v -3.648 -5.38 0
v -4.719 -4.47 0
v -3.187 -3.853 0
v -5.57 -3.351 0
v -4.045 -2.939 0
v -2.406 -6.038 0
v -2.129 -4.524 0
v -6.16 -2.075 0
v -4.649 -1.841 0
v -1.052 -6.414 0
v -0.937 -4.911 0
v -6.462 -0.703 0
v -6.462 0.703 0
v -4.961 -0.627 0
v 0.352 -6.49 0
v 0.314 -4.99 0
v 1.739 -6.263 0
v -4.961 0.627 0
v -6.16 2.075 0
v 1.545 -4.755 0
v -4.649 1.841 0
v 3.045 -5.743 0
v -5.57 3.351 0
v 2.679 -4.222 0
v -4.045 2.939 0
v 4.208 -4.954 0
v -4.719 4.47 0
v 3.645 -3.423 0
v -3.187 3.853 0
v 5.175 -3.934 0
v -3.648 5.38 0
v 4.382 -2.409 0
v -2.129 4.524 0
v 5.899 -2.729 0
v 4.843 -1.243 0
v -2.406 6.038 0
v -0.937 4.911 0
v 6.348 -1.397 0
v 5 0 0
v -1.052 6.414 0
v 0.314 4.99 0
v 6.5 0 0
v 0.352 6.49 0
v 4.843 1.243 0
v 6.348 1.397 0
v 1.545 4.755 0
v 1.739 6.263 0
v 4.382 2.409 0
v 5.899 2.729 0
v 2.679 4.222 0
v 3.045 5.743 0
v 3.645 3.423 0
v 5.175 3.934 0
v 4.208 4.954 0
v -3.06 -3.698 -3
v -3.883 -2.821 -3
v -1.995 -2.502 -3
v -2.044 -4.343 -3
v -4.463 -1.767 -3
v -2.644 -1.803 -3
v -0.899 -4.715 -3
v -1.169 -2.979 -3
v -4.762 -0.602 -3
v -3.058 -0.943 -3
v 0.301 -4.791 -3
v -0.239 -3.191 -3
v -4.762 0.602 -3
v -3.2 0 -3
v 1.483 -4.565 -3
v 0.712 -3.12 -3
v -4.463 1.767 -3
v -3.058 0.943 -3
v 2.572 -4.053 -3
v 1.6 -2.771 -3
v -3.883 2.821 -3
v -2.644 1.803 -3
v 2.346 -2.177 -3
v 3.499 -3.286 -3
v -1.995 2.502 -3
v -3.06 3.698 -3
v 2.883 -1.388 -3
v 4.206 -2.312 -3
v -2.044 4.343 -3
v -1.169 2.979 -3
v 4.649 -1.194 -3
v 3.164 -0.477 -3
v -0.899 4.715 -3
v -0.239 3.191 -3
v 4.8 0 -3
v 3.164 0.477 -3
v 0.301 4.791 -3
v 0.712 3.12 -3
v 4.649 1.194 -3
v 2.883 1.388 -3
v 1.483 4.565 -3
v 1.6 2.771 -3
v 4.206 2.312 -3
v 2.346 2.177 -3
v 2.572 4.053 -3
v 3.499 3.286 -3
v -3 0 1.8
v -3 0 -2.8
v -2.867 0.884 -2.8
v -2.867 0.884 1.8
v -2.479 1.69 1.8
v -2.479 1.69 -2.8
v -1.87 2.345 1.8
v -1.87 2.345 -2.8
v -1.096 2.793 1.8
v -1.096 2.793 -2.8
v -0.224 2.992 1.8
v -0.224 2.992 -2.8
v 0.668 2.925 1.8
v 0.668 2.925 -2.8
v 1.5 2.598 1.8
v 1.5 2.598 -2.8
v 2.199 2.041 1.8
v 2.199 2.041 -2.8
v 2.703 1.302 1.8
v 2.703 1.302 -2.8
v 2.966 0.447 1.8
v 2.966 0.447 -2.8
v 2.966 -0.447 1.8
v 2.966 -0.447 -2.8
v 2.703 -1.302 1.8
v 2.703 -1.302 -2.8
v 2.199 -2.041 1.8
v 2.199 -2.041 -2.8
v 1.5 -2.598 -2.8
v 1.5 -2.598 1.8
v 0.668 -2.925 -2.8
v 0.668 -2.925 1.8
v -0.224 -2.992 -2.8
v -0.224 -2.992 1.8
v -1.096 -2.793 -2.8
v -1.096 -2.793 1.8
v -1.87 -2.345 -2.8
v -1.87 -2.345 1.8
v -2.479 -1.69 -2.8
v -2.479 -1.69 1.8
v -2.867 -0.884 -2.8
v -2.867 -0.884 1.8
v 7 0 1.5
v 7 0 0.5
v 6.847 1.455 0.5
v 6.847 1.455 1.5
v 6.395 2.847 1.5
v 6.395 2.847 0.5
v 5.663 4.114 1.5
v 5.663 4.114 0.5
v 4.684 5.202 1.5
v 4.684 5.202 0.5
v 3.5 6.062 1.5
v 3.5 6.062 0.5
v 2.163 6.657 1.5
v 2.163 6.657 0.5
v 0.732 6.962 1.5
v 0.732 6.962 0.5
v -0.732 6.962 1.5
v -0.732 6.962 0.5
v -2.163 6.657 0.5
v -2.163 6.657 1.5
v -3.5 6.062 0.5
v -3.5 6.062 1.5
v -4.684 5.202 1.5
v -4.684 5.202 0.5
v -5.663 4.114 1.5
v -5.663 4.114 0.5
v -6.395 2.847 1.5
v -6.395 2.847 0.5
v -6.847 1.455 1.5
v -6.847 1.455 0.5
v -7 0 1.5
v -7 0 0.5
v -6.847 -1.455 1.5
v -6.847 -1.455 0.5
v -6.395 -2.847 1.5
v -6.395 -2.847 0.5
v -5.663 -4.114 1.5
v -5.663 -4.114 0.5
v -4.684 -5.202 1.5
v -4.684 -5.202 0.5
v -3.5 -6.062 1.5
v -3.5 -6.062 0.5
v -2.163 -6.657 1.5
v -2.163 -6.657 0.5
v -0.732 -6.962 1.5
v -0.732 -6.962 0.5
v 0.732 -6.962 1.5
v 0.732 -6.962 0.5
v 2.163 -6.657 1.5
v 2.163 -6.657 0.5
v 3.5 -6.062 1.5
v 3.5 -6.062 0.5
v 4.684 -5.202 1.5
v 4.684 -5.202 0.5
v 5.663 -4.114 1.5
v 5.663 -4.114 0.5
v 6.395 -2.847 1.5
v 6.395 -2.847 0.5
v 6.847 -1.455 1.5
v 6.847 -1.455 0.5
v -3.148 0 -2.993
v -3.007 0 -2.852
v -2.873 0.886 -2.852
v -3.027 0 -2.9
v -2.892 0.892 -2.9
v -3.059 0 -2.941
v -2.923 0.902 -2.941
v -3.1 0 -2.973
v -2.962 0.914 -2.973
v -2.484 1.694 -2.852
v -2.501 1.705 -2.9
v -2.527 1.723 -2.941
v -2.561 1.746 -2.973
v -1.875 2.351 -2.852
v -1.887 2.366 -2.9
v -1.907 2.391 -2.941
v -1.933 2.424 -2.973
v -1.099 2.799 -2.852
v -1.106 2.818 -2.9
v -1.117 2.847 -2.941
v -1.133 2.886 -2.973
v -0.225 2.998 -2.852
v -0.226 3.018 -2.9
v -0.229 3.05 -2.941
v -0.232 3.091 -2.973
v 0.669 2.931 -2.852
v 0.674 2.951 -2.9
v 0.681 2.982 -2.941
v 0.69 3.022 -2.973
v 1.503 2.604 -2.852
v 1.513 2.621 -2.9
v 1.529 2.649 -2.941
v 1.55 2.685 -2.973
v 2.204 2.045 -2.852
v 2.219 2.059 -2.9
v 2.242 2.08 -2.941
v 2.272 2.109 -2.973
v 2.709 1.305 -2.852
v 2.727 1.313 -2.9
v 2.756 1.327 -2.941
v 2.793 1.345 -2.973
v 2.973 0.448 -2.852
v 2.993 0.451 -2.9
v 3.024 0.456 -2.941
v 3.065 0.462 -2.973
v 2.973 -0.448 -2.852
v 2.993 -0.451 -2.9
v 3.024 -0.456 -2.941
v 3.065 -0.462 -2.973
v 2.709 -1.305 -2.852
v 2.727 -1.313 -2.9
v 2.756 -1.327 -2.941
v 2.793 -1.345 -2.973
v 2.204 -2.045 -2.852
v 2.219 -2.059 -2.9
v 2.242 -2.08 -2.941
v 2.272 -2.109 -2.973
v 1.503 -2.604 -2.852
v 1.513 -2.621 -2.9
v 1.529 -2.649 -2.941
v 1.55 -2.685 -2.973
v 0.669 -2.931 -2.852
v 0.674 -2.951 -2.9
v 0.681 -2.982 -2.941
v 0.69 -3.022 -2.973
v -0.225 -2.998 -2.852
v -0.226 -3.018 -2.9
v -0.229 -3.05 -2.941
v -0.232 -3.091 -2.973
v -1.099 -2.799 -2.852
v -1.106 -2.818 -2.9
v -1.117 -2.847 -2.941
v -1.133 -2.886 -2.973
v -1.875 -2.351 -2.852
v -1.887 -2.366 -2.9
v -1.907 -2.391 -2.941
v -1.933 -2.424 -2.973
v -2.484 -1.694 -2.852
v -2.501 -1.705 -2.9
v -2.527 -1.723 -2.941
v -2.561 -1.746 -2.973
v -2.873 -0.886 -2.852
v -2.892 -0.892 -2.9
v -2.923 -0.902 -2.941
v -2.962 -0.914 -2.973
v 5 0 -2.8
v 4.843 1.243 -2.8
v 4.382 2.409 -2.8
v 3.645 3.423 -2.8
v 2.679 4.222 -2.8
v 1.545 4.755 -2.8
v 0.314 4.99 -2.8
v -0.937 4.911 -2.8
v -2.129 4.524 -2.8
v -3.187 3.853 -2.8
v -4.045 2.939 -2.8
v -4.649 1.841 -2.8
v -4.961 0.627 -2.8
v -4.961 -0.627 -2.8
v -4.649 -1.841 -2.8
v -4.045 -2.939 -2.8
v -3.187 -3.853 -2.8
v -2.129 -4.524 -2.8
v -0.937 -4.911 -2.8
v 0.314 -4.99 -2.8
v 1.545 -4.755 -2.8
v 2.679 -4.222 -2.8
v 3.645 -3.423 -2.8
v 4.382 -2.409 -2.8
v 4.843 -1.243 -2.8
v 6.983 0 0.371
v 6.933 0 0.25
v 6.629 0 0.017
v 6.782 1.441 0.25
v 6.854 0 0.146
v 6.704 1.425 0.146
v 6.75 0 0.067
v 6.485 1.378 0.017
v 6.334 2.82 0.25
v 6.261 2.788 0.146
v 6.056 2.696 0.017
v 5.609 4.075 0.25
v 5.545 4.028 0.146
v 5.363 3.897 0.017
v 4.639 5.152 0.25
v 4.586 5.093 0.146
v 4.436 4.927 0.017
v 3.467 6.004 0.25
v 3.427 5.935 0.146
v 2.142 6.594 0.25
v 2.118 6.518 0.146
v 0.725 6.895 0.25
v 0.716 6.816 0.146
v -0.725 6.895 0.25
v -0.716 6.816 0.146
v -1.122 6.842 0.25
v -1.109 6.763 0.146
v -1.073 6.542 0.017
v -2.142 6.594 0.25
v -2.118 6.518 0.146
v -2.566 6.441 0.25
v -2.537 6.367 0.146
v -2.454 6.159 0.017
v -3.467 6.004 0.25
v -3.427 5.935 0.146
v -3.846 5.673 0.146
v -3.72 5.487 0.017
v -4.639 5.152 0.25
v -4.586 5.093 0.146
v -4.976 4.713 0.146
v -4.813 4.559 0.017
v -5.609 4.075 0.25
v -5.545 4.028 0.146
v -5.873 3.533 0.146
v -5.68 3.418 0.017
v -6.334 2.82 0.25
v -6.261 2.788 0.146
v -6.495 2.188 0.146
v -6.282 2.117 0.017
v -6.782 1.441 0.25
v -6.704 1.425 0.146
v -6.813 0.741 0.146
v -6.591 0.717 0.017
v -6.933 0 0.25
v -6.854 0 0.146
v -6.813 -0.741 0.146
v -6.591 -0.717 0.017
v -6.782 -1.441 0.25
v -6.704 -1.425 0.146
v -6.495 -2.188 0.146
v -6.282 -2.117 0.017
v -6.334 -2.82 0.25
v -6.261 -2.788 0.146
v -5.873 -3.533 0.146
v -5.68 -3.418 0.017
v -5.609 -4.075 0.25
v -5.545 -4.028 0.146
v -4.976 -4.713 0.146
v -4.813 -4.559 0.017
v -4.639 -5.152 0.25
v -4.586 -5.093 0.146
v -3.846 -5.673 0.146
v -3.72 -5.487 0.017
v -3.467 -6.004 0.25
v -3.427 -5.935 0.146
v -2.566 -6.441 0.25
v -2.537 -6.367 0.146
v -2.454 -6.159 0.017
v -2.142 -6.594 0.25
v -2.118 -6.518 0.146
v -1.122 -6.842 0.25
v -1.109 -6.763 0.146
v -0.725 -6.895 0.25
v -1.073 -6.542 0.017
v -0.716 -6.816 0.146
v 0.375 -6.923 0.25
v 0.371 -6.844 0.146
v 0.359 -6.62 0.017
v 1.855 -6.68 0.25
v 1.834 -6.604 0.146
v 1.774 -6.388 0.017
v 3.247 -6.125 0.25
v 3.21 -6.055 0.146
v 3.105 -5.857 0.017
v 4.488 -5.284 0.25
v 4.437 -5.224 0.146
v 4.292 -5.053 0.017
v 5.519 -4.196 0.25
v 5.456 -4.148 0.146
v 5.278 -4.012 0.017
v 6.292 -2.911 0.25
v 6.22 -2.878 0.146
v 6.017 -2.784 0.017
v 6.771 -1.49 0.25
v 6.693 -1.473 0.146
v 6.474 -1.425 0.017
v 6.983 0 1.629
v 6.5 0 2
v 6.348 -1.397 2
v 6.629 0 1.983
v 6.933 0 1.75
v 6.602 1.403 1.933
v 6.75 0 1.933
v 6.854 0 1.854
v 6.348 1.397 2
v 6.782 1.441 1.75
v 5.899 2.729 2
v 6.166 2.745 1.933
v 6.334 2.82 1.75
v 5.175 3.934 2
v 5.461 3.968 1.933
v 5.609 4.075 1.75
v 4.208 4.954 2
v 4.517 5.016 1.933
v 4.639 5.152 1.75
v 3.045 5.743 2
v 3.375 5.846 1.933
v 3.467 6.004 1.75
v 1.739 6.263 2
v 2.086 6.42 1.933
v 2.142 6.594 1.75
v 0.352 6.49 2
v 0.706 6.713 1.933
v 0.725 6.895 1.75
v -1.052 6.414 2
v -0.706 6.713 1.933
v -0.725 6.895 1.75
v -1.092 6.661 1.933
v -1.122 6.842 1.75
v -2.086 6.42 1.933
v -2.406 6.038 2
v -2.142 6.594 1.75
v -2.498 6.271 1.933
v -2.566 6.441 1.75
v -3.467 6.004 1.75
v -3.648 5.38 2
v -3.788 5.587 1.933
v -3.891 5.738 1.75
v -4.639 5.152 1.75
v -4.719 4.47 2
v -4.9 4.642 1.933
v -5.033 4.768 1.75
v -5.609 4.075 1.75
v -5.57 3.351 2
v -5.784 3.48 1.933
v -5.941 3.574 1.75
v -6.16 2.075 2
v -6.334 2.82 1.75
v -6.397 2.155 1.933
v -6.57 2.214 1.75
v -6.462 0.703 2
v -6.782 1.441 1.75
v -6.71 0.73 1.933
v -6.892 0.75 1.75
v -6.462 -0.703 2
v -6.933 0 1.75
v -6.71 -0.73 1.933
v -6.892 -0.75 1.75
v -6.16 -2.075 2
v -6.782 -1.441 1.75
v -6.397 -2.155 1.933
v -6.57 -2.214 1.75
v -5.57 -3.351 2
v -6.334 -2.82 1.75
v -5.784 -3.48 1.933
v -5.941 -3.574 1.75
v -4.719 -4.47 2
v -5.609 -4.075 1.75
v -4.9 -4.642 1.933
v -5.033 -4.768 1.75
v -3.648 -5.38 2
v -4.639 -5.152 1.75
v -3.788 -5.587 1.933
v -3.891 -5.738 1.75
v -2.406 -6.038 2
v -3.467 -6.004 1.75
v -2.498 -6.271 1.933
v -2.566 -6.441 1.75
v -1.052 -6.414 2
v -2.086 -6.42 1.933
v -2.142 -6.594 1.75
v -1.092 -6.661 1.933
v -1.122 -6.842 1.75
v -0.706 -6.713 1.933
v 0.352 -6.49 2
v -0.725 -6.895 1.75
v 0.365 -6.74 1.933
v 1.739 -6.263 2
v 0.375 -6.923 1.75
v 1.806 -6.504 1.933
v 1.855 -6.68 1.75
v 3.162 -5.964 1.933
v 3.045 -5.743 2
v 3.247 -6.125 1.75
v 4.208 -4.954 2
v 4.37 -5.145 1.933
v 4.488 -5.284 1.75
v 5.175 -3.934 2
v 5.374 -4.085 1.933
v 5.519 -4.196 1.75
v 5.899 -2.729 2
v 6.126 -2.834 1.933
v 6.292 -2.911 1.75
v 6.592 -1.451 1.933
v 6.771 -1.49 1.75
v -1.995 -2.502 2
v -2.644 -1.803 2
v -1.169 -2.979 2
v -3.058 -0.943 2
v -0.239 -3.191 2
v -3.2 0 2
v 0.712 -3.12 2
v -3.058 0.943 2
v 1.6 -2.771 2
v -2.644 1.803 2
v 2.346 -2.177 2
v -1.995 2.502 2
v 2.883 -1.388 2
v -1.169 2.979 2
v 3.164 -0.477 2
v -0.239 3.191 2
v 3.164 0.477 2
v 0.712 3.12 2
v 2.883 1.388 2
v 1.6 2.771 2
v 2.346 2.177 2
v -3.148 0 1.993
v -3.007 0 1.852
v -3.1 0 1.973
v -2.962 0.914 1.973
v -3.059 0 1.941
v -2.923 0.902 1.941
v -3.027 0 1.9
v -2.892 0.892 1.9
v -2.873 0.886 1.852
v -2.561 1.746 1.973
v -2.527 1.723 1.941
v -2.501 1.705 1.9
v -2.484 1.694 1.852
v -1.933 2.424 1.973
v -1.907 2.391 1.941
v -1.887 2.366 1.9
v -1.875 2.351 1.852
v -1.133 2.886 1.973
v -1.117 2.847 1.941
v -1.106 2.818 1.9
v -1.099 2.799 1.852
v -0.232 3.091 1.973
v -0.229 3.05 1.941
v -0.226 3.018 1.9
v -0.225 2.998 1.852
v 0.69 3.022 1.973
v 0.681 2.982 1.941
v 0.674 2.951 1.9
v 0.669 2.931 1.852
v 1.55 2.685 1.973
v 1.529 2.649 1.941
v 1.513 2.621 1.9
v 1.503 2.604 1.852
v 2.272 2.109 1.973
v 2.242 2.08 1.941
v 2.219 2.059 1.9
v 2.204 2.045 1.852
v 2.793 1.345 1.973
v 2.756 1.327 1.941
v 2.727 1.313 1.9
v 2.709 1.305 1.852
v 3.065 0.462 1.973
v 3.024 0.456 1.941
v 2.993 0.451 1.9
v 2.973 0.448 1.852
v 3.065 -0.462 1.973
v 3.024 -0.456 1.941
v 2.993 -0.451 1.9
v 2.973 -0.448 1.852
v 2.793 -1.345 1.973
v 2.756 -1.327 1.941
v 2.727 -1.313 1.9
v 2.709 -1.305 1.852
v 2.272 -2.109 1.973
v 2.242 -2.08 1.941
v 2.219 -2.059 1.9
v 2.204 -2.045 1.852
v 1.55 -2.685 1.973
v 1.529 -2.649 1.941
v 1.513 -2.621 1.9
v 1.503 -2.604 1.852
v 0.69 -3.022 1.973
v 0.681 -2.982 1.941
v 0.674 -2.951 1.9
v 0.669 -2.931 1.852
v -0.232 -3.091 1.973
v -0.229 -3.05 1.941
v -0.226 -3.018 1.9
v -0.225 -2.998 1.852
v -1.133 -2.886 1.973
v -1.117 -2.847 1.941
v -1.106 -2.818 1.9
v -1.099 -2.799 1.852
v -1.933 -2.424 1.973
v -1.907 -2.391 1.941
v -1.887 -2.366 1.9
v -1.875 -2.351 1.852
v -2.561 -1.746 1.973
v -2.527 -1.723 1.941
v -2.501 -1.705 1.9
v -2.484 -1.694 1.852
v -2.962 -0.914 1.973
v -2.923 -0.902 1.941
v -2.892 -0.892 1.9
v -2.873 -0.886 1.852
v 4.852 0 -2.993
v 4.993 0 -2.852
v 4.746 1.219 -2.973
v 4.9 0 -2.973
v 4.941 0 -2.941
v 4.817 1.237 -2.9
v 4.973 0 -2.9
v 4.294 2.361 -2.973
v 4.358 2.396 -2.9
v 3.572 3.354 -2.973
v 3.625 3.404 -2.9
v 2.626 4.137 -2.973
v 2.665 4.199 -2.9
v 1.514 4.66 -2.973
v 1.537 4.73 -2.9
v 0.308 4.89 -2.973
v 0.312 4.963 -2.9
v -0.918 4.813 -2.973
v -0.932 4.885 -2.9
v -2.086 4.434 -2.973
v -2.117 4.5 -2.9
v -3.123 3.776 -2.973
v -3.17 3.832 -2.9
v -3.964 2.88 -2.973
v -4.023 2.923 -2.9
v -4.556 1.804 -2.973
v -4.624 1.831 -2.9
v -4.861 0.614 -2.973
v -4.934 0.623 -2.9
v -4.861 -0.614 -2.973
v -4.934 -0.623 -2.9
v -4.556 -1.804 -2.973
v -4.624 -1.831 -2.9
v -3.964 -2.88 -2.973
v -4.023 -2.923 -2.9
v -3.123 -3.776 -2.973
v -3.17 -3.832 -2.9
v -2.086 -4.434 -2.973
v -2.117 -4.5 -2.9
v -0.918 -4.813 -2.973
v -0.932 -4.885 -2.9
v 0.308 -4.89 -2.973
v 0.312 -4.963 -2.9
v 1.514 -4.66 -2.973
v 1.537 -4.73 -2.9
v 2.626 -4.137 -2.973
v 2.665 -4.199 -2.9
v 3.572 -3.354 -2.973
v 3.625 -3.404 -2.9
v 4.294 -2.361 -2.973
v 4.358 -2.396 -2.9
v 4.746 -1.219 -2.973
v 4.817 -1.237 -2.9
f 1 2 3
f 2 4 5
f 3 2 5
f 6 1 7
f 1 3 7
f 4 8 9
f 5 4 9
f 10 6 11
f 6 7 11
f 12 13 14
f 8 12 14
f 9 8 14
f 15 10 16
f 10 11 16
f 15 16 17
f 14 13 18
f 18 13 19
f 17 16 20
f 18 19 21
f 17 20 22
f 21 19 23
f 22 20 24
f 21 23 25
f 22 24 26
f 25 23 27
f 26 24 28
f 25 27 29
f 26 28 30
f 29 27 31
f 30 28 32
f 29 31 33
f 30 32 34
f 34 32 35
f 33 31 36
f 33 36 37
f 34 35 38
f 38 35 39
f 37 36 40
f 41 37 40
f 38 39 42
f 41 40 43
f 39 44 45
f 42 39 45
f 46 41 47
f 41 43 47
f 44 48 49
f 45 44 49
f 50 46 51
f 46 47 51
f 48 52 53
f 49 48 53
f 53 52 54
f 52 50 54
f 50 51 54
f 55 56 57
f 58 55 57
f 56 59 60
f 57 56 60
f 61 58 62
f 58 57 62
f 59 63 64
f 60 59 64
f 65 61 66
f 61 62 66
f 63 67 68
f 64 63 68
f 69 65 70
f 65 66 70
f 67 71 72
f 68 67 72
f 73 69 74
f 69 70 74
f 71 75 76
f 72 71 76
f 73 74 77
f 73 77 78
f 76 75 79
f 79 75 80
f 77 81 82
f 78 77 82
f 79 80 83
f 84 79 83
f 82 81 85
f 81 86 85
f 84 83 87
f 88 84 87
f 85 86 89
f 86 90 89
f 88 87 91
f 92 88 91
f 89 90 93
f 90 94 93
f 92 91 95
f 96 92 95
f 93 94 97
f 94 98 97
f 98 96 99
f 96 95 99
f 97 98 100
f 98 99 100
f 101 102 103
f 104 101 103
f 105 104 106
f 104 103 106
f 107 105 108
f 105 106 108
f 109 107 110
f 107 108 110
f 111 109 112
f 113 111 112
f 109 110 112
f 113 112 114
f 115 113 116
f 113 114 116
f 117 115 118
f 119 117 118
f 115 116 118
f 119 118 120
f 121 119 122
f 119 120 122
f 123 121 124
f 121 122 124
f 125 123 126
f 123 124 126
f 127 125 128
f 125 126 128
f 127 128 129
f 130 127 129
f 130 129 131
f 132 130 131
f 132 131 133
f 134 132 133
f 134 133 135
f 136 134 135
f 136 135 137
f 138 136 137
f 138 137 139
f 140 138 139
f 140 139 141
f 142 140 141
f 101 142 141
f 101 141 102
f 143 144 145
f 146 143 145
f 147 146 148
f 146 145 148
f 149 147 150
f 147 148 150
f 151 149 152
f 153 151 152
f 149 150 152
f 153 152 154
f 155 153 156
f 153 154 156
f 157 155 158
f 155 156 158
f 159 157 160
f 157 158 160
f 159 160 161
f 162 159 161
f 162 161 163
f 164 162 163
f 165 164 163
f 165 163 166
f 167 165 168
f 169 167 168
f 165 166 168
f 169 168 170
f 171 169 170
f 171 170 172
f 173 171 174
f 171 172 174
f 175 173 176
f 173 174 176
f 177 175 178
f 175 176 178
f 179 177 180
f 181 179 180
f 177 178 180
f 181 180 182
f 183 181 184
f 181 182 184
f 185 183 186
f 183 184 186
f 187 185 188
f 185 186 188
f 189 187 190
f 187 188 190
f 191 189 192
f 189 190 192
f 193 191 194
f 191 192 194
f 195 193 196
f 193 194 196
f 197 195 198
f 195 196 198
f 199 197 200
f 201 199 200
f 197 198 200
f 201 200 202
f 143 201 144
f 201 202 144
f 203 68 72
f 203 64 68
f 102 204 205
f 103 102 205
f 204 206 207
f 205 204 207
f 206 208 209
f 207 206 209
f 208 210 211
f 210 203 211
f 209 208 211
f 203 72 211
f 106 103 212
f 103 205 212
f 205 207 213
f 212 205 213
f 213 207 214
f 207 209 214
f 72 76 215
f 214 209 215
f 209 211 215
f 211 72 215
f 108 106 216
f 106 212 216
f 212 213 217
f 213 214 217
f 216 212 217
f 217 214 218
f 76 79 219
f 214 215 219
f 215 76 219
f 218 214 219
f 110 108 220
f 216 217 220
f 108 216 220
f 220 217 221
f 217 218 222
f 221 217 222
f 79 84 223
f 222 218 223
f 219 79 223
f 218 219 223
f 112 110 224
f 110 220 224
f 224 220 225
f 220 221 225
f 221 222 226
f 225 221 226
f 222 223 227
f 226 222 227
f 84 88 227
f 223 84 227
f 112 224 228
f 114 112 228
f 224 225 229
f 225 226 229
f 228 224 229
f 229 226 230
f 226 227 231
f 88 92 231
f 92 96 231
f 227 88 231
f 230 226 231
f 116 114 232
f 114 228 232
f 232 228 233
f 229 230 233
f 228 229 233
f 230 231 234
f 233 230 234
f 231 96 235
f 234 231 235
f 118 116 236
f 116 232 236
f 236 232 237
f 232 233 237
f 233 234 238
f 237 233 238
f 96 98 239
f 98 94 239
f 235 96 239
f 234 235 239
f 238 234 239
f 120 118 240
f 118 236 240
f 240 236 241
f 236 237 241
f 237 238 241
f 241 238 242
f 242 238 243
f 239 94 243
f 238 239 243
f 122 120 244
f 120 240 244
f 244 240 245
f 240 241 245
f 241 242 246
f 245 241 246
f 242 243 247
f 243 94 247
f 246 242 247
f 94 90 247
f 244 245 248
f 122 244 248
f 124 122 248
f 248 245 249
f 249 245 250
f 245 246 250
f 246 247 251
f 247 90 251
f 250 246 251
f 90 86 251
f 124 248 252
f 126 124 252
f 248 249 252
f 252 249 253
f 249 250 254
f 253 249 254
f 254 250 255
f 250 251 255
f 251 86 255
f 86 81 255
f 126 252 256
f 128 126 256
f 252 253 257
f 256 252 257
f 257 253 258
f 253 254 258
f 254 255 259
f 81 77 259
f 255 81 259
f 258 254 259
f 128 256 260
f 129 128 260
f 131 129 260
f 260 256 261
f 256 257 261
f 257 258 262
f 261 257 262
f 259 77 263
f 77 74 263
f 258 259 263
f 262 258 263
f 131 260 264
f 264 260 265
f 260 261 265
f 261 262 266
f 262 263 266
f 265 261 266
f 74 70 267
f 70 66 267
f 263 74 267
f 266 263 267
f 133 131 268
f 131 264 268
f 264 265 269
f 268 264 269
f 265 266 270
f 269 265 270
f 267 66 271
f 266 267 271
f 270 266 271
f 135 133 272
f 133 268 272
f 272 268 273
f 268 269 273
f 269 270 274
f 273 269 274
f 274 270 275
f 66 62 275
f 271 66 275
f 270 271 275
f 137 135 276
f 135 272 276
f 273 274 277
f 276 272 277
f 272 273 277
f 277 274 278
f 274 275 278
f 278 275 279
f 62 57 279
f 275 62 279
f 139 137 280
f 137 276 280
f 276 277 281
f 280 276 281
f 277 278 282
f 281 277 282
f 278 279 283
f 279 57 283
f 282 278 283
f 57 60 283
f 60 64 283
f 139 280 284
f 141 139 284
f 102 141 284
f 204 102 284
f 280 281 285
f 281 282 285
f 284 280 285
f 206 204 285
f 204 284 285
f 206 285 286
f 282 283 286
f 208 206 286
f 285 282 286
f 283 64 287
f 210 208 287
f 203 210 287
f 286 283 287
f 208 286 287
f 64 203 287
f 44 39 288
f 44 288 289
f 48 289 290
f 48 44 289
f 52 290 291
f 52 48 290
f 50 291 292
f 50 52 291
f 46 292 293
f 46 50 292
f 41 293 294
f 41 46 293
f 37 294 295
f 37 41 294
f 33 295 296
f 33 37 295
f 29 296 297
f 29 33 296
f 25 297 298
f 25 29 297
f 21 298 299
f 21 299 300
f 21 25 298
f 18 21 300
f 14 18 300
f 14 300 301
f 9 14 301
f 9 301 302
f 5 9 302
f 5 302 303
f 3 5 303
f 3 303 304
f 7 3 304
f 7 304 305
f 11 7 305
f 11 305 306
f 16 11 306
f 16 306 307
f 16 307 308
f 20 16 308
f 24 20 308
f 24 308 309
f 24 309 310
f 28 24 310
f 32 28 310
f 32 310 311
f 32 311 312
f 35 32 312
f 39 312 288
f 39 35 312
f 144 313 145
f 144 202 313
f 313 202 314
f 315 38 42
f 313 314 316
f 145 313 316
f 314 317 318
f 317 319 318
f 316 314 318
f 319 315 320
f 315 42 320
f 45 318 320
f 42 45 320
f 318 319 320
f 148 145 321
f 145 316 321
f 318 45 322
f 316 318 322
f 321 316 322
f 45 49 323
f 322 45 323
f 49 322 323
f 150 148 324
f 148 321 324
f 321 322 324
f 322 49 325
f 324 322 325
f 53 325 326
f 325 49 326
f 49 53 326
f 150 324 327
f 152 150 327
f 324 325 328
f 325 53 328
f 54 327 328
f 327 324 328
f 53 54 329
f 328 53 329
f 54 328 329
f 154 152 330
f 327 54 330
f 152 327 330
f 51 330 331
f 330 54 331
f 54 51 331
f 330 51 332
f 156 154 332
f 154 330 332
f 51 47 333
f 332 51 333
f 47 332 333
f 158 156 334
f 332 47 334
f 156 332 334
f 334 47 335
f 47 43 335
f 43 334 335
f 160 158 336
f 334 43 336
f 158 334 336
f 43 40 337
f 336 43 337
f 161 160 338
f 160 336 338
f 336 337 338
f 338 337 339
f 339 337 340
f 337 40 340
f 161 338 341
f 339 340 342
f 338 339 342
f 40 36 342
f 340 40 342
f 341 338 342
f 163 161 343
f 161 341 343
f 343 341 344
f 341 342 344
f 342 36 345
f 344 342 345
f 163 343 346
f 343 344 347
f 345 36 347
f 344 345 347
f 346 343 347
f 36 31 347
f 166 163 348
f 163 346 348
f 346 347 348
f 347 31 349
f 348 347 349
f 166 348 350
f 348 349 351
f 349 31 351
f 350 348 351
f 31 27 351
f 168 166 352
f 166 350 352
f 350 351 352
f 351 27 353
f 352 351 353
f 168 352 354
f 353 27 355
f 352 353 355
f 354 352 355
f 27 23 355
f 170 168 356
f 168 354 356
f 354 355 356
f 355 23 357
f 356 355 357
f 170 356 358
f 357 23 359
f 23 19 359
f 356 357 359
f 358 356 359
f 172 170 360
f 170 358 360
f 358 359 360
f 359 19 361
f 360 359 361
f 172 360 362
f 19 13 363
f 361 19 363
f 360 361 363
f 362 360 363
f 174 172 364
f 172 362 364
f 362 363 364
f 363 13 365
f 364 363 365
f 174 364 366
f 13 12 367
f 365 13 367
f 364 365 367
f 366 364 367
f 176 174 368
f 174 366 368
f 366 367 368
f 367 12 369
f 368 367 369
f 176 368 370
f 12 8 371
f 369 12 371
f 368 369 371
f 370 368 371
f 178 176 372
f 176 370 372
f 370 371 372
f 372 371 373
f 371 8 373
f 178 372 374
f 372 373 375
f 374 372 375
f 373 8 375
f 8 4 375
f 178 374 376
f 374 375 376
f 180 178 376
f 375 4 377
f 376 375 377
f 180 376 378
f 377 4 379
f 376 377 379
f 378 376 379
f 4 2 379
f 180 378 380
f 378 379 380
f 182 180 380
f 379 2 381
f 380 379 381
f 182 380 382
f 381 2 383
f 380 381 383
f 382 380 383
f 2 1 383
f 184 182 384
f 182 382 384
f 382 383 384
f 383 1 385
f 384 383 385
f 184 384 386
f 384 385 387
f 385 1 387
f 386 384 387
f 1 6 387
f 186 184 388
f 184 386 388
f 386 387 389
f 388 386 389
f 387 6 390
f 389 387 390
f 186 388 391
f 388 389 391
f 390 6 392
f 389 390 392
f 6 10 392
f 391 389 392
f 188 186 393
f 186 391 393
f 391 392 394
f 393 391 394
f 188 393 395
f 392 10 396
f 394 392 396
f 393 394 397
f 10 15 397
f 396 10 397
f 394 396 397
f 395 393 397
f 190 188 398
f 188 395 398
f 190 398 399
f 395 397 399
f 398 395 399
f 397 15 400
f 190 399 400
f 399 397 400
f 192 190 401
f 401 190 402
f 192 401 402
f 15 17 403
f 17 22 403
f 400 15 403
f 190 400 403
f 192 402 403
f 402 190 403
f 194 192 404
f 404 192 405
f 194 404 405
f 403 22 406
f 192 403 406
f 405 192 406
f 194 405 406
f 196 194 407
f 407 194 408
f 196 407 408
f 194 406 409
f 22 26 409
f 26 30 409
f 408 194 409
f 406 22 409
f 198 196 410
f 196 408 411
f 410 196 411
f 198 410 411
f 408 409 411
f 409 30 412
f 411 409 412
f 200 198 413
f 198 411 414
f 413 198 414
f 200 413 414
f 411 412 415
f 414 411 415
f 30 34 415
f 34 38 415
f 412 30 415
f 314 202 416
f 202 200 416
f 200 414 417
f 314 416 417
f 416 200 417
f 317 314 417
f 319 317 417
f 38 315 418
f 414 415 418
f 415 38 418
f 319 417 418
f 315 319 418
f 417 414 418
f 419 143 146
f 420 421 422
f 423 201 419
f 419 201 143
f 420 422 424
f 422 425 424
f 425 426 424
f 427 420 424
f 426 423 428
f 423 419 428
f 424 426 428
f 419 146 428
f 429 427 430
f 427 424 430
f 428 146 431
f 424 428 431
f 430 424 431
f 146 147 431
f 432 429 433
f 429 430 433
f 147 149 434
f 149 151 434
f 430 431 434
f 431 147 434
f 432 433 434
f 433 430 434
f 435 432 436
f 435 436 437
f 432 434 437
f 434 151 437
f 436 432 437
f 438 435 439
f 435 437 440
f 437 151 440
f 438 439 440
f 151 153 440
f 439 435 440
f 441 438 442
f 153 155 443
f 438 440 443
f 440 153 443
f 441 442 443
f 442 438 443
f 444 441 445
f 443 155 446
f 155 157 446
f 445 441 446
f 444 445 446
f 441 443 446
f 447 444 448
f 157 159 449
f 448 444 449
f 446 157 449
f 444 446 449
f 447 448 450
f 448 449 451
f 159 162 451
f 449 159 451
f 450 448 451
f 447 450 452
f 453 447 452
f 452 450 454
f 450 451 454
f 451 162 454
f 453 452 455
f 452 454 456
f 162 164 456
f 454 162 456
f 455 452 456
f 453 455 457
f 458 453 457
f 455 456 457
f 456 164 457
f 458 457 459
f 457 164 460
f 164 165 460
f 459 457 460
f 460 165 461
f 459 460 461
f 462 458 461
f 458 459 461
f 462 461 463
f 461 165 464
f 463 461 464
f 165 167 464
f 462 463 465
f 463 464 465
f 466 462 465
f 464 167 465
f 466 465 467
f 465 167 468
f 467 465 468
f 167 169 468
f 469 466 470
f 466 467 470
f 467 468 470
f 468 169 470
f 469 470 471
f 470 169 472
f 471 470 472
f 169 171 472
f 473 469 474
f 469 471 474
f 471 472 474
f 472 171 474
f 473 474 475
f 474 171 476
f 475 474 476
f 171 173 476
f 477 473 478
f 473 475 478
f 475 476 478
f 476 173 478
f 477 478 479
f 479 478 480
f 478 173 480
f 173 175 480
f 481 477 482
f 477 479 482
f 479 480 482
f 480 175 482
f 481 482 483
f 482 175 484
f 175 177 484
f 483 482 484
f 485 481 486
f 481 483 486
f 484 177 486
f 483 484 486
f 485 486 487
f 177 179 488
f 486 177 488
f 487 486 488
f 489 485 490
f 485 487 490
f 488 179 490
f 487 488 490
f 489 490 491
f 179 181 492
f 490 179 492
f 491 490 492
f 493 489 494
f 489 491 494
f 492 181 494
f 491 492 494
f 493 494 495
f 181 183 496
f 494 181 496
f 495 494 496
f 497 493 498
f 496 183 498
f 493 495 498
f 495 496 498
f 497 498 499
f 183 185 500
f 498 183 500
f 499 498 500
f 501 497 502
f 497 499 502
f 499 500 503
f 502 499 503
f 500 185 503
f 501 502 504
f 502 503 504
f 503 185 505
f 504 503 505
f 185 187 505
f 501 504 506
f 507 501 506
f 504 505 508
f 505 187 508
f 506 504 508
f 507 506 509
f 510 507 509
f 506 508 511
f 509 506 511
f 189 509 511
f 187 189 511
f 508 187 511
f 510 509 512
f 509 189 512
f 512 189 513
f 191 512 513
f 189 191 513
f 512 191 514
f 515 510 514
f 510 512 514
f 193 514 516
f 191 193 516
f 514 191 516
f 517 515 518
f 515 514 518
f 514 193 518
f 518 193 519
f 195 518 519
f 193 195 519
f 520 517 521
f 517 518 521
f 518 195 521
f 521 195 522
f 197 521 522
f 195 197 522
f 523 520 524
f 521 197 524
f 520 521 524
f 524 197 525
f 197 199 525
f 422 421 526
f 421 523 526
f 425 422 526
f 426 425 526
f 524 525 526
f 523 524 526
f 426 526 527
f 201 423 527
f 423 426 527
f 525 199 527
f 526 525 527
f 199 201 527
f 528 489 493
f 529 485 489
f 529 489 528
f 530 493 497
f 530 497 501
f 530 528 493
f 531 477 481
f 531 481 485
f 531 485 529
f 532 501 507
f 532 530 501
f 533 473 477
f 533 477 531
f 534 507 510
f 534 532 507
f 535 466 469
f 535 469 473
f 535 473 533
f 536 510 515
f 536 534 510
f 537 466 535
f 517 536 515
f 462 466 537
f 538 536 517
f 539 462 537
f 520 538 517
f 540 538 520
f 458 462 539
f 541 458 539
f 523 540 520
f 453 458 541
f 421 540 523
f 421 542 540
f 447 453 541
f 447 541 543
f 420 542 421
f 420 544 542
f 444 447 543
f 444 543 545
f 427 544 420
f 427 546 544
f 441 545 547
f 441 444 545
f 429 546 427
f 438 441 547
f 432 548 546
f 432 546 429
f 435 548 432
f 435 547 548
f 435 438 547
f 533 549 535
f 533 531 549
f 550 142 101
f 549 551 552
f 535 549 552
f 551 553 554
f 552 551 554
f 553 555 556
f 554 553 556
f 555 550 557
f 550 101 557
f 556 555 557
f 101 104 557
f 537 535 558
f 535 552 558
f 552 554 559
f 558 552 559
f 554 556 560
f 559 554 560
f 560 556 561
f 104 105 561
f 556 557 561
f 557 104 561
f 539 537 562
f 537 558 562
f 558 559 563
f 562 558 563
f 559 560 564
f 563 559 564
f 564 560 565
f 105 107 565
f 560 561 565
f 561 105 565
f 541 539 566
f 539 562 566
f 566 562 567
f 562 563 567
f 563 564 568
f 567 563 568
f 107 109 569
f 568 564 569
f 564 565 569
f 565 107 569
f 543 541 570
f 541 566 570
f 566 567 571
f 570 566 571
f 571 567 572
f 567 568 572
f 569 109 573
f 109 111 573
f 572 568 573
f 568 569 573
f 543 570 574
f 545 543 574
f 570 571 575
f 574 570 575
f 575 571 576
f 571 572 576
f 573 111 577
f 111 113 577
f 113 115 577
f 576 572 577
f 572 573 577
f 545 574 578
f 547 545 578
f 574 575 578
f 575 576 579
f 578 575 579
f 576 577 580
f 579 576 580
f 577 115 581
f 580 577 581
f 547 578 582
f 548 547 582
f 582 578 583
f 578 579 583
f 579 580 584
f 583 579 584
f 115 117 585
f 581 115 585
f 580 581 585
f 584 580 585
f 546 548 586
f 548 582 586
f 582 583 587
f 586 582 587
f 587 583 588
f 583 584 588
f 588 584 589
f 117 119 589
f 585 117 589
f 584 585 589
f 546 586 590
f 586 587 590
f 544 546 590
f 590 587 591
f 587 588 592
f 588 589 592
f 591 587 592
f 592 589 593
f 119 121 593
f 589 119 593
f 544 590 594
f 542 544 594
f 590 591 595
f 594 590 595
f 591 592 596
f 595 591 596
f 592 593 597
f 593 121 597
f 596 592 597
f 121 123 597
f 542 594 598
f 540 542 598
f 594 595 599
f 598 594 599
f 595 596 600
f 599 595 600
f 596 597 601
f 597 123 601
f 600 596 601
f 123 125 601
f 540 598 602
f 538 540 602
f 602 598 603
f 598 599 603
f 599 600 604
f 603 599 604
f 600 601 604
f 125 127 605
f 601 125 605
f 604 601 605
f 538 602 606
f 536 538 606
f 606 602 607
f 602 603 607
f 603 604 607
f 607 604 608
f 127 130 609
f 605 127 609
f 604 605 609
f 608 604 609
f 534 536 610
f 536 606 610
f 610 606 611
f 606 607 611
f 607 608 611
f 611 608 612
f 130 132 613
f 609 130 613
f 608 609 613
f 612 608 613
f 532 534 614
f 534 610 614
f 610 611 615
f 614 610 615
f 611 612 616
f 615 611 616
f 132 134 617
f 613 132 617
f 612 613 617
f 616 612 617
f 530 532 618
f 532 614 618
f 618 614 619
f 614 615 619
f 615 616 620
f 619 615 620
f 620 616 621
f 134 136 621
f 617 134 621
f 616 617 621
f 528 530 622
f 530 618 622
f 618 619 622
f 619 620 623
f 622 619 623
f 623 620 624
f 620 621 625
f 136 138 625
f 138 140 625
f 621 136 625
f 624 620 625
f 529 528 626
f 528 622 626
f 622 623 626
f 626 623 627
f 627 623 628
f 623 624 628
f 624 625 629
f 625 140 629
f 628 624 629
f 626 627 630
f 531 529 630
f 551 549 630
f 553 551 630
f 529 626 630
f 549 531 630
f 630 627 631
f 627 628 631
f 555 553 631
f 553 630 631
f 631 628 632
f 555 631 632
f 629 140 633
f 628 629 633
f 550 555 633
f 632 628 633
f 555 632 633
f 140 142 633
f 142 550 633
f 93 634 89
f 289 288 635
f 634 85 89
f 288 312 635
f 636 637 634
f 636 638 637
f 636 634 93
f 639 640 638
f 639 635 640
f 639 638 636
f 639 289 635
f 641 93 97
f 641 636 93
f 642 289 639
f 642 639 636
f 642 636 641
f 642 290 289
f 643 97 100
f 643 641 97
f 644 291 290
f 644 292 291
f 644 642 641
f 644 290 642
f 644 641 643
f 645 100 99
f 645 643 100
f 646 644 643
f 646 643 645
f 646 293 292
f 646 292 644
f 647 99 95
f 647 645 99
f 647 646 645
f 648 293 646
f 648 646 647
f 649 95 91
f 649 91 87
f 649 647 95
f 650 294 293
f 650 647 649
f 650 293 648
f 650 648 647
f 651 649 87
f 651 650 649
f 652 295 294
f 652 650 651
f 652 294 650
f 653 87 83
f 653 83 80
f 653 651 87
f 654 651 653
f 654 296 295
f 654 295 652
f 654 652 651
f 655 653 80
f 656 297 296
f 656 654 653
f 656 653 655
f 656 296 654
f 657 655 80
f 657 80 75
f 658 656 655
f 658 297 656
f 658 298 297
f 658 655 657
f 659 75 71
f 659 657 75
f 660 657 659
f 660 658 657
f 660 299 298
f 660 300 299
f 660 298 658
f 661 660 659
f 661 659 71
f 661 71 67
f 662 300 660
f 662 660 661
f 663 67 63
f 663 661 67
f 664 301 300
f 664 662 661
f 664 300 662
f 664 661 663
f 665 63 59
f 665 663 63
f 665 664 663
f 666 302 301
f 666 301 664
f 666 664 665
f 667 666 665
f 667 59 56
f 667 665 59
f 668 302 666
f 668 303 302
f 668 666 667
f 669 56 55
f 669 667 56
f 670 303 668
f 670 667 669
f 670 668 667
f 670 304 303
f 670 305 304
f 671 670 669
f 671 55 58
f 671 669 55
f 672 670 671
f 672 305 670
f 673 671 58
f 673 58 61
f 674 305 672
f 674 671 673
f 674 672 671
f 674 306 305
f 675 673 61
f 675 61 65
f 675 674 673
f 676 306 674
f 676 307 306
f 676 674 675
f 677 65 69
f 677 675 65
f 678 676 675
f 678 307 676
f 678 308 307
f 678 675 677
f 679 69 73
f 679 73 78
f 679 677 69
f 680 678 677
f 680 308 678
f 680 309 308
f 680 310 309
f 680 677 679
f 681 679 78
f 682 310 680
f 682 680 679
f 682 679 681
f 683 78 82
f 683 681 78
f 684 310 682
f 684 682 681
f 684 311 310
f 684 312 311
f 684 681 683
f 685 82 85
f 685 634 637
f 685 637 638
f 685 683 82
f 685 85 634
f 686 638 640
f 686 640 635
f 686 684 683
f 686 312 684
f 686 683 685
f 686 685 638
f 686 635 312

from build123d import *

# Parameters (mm, degrees)
SKETCH_2_R                = 7
EXTRUDE_1_DEPTH           = 2
SKETCH_3_R                = 5
EXTRUDE_2_DEPTH           = 5
HOLE_WIZARD_6_0_6_1_D     = 6
HOLE_WIZARD_6_0_6_1_DEPTH = 30.32
HOLE_WIZARD_6_0_6_1_TIP   = 1.802581857
FILLET_1_R                = 0.5
FILLET_2_R                = 0.2


with BuildPart() as part:
    # 草图2 → 凸台-拉伸1 (new body)
    with BuildSketch(Plane.XY):
        Circle(SKETCH_2_R)
    extrude(amount=EXTRUDE_1_DEPTH)

    # 草图3 → 凸台-拉伸2 (add)
    with BuildSketch(Plane.XY.offset(2)):
        Circle(SKETCH_3_R)
    extrude(amount=-EXTRUDE_2_DEPTH)

    # Ø6.0 (6) 直径孔1
    with Locations(Plane.XY.offset(2)):
        with Locations((0, 0)):
            Hole(HOLE_WIZARD_6_0_6_1_D / 2, depth=HOLE_WIZARD_6_0_6_1_DEPTH)
            with Locations((0, 0, -(HOLE_WIZARD_6_0_6_1_DEPTH + HOLE_WIZARD_6_0_6_1_TIP / 2))):  # 118° drill point
                Cone(0, HOLE_WIZARD_6_0_6_1_D / 2, HOLE_WIZARD_6_0_6_1_TIP, mode=Mode.SUBTRACT)

    # 圆角1
    fillet_1_edges = [part.edges().sort_by_distance(p)[0] for p in [
        (-7, 0, 0),
        (-7, 0, 2),
    ]]
    fillet(fillet_1_edges, radius=FILLET_1_R)

    # 圆角2
    fillet_2_edges = [part.edges().sort_by_distance(p)[0] for p in [
        (3, 0, -3),
        (3, 0, 2),
        (-5, 0, -3),
    ]]
    fillet(fillet_2_edges, radius=FILLET_2_R)


solid = part.part
